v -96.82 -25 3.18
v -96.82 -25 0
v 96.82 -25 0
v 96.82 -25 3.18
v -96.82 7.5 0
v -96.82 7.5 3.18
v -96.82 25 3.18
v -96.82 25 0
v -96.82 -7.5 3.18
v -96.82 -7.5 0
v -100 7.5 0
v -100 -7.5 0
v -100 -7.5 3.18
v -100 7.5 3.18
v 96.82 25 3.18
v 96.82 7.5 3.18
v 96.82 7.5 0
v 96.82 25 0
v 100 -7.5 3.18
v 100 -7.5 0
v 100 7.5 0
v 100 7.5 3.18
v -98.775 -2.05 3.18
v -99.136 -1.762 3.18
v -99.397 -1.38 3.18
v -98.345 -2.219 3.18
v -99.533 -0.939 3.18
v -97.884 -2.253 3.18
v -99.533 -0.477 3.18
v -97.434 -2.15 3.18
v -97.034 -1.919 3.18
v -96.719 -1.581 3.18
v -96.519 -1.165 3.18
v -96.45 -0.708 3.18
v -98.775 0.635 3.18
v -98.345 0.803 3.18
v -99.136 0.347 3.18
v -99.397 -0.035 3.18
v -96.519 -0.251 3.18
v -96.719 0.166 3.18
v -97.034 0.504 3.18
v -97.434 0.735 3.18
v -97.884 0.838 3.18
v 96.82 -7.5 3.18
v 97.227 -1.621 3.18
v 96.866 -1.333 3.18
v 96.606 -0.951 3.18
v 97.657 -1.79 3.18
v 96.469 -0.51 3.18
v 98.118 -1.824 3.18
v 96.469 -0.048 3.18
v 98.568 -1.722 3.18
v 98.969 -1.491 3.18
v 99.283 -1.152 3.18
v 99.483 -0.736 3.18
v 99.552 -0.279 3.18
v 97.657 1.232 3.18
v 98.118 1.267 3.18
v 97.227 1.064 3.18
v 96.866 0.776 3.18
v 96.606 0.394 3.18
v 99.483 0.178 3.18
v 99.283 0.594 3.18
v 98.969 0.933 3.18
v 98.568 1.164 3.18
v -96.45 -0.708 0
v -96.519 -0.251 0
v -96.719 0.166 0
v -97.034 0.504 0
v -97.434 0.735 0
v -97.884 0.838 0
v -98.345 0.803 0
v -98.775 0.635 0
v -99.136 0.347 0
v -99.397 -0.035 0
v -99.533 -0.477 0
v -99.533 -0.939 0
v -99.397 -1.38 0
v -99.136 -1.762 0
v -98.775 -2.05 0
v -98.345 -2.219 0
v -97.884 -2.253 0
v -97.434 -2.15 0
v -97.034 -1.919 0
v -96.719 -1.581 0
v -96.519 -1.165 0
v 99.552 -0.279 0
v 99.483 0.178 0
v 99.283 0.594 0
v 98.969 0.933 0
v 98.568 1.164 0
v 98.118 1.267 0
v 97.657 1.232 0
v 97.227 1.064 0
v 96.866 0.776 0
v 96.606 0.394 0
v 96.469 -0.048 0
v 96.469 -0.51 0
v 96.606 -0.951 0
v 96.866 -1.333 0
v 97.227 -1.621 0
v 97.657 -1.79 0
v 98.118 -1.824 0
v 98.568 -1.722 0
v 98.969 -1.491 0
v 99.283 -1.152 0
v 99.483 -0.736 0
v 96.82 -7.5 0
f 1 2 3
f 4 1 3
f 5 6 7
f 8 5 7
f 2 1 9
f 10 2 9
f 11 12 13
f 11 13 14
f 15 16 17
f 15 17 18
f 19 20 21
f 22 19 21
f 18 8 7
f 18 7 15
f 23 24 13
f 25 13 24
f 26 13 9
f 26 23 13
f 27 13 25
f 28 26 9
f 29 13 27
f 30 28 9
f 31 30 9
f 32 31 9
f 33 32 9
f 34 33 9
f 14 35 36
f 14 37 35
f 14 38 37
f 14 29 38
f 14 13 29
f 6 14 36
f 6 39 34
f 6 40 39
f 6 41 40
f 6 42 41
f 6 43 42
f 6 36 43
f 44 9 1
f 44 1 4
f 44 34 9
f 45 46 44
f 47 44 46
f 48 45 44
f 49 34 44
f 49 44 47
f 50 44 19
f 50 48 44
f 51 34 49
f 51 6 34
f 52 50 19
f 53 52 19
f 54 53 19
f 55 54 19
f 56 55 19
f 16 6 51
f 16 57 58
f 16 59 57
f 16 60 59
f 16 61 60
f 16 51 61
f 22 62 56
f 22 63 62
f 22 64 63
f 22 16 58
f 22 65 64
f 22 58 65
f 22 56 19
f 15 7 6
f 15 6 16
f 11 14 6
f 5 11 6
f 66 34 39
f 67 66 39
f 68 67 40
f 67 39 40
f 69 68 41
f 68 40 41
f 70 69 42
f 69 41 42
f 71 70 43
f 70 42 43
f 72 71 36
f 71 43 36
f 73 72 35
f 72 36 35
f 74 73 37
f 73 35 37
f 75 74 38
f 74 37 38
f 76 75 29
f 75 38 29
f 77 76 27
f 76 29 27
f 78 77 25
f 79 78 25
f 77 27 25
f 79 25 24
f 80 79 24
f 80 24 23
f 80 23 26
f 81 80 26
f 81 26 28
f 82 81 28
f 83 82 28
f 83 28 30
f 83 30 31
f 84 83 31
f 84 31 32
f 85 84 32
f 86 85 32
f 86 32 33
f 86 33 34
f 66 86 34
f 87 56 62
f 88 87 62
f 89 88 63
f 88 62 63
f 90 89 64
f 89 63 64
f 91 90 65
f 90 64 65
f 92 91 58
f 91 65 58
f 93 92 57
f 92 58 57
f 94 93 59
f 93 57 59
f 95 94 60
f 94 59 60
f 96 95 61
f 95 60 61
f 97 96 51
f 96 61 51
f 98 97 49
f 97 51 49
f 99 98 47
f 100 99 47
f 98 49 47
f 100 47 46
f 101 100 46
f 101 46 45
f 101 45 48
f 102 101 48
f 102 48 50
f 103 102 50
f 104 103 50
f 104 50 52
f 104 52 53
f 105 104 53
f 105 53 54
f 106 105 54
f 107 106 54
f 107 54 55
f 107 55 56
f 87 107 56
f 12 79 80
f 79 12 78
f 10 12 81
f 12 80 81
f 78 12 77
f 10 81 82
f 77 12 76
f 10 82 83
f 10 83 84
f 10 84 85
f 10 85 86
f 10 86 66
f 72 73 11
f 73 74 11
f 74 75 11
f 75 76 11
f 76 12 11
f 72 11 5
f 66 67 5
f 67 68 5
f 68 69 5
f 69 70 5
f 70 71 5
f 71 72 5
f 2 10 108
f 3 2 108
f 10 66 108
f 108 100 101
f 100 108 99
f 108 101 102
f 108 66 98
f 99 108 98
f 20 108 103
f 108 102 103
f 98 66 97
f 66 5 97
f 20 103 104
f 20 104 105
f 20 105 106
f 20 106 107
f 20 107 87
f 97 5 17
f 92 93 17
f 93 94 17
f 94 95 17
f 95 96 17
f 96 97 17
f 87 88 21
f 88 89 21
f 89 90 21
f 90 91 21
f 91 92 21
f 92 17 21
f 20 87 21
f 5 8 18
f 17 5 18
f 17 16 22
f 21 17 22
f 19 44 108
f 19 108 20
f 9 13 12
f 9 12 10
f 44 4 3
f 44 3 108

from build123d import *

# Parameters (mm, degrees)
SKETCH1_W           = 200
SKETCH1_H           = 50
BOSS_EXTRUDE2_DEPTH = 3.18
SKETCH3_W           = 3.18
SKETCH3_H           = 17.5
CUT_EXTRUDE1_DEPTH  = 104.12668132
SKETCH4_R           = 1.55
CUT_EXTRUDE2_DEPTH  = 104.12668132


with BuildPart() as part:
    # Sketch1 → Boss-Extrude2 (new body)
    with BuildSketch(Plane.XY):
        Rectangle(SKETCH1_W, SKETCH1_H)
    extrude(amount=BOSS_EXTRUDE2_DEPTH)

    # Sketch3 → Cut-Extrude1 (cut, through all)
    with BuildSketch(Plane.XY.offset(3.18)):
        with Locations((-98.41, 16.25)):
            Rectangle(SKETCH3_W, SKETCH3_H)
        with Locations((-98.41, -16.25)):
            Rectangle(SKETCH3_W, SKETCH3_H)
        with Locations((98.41, 16.25)):
            Rectangle(SKETCH3_W, SKETCH3_H)
        with Locations((98.41, -16.25)):
            Rectangle(SKETCH3_W, SKETCH3_H)
    extrude(amount=-CUT_EXTRUDE1_DEPTH, mode=Mode.SUBTRACT)

    # Sketch4 → Cut-Extrude2 (cut, through all)
    with BuildSketch(Plane.XY.offset(3.18)):
        with Locations((-98, -0.707640919)):
            Circle(SKETCH4_R)
        with Locations((98.002158409, -0.27875217)):
            Circle(SKETCH4_R)
    extrude(amount=-CUT_EXTRUDE2_DEPTH, mode=Mode.SUBTRACT)


solid = part.part
